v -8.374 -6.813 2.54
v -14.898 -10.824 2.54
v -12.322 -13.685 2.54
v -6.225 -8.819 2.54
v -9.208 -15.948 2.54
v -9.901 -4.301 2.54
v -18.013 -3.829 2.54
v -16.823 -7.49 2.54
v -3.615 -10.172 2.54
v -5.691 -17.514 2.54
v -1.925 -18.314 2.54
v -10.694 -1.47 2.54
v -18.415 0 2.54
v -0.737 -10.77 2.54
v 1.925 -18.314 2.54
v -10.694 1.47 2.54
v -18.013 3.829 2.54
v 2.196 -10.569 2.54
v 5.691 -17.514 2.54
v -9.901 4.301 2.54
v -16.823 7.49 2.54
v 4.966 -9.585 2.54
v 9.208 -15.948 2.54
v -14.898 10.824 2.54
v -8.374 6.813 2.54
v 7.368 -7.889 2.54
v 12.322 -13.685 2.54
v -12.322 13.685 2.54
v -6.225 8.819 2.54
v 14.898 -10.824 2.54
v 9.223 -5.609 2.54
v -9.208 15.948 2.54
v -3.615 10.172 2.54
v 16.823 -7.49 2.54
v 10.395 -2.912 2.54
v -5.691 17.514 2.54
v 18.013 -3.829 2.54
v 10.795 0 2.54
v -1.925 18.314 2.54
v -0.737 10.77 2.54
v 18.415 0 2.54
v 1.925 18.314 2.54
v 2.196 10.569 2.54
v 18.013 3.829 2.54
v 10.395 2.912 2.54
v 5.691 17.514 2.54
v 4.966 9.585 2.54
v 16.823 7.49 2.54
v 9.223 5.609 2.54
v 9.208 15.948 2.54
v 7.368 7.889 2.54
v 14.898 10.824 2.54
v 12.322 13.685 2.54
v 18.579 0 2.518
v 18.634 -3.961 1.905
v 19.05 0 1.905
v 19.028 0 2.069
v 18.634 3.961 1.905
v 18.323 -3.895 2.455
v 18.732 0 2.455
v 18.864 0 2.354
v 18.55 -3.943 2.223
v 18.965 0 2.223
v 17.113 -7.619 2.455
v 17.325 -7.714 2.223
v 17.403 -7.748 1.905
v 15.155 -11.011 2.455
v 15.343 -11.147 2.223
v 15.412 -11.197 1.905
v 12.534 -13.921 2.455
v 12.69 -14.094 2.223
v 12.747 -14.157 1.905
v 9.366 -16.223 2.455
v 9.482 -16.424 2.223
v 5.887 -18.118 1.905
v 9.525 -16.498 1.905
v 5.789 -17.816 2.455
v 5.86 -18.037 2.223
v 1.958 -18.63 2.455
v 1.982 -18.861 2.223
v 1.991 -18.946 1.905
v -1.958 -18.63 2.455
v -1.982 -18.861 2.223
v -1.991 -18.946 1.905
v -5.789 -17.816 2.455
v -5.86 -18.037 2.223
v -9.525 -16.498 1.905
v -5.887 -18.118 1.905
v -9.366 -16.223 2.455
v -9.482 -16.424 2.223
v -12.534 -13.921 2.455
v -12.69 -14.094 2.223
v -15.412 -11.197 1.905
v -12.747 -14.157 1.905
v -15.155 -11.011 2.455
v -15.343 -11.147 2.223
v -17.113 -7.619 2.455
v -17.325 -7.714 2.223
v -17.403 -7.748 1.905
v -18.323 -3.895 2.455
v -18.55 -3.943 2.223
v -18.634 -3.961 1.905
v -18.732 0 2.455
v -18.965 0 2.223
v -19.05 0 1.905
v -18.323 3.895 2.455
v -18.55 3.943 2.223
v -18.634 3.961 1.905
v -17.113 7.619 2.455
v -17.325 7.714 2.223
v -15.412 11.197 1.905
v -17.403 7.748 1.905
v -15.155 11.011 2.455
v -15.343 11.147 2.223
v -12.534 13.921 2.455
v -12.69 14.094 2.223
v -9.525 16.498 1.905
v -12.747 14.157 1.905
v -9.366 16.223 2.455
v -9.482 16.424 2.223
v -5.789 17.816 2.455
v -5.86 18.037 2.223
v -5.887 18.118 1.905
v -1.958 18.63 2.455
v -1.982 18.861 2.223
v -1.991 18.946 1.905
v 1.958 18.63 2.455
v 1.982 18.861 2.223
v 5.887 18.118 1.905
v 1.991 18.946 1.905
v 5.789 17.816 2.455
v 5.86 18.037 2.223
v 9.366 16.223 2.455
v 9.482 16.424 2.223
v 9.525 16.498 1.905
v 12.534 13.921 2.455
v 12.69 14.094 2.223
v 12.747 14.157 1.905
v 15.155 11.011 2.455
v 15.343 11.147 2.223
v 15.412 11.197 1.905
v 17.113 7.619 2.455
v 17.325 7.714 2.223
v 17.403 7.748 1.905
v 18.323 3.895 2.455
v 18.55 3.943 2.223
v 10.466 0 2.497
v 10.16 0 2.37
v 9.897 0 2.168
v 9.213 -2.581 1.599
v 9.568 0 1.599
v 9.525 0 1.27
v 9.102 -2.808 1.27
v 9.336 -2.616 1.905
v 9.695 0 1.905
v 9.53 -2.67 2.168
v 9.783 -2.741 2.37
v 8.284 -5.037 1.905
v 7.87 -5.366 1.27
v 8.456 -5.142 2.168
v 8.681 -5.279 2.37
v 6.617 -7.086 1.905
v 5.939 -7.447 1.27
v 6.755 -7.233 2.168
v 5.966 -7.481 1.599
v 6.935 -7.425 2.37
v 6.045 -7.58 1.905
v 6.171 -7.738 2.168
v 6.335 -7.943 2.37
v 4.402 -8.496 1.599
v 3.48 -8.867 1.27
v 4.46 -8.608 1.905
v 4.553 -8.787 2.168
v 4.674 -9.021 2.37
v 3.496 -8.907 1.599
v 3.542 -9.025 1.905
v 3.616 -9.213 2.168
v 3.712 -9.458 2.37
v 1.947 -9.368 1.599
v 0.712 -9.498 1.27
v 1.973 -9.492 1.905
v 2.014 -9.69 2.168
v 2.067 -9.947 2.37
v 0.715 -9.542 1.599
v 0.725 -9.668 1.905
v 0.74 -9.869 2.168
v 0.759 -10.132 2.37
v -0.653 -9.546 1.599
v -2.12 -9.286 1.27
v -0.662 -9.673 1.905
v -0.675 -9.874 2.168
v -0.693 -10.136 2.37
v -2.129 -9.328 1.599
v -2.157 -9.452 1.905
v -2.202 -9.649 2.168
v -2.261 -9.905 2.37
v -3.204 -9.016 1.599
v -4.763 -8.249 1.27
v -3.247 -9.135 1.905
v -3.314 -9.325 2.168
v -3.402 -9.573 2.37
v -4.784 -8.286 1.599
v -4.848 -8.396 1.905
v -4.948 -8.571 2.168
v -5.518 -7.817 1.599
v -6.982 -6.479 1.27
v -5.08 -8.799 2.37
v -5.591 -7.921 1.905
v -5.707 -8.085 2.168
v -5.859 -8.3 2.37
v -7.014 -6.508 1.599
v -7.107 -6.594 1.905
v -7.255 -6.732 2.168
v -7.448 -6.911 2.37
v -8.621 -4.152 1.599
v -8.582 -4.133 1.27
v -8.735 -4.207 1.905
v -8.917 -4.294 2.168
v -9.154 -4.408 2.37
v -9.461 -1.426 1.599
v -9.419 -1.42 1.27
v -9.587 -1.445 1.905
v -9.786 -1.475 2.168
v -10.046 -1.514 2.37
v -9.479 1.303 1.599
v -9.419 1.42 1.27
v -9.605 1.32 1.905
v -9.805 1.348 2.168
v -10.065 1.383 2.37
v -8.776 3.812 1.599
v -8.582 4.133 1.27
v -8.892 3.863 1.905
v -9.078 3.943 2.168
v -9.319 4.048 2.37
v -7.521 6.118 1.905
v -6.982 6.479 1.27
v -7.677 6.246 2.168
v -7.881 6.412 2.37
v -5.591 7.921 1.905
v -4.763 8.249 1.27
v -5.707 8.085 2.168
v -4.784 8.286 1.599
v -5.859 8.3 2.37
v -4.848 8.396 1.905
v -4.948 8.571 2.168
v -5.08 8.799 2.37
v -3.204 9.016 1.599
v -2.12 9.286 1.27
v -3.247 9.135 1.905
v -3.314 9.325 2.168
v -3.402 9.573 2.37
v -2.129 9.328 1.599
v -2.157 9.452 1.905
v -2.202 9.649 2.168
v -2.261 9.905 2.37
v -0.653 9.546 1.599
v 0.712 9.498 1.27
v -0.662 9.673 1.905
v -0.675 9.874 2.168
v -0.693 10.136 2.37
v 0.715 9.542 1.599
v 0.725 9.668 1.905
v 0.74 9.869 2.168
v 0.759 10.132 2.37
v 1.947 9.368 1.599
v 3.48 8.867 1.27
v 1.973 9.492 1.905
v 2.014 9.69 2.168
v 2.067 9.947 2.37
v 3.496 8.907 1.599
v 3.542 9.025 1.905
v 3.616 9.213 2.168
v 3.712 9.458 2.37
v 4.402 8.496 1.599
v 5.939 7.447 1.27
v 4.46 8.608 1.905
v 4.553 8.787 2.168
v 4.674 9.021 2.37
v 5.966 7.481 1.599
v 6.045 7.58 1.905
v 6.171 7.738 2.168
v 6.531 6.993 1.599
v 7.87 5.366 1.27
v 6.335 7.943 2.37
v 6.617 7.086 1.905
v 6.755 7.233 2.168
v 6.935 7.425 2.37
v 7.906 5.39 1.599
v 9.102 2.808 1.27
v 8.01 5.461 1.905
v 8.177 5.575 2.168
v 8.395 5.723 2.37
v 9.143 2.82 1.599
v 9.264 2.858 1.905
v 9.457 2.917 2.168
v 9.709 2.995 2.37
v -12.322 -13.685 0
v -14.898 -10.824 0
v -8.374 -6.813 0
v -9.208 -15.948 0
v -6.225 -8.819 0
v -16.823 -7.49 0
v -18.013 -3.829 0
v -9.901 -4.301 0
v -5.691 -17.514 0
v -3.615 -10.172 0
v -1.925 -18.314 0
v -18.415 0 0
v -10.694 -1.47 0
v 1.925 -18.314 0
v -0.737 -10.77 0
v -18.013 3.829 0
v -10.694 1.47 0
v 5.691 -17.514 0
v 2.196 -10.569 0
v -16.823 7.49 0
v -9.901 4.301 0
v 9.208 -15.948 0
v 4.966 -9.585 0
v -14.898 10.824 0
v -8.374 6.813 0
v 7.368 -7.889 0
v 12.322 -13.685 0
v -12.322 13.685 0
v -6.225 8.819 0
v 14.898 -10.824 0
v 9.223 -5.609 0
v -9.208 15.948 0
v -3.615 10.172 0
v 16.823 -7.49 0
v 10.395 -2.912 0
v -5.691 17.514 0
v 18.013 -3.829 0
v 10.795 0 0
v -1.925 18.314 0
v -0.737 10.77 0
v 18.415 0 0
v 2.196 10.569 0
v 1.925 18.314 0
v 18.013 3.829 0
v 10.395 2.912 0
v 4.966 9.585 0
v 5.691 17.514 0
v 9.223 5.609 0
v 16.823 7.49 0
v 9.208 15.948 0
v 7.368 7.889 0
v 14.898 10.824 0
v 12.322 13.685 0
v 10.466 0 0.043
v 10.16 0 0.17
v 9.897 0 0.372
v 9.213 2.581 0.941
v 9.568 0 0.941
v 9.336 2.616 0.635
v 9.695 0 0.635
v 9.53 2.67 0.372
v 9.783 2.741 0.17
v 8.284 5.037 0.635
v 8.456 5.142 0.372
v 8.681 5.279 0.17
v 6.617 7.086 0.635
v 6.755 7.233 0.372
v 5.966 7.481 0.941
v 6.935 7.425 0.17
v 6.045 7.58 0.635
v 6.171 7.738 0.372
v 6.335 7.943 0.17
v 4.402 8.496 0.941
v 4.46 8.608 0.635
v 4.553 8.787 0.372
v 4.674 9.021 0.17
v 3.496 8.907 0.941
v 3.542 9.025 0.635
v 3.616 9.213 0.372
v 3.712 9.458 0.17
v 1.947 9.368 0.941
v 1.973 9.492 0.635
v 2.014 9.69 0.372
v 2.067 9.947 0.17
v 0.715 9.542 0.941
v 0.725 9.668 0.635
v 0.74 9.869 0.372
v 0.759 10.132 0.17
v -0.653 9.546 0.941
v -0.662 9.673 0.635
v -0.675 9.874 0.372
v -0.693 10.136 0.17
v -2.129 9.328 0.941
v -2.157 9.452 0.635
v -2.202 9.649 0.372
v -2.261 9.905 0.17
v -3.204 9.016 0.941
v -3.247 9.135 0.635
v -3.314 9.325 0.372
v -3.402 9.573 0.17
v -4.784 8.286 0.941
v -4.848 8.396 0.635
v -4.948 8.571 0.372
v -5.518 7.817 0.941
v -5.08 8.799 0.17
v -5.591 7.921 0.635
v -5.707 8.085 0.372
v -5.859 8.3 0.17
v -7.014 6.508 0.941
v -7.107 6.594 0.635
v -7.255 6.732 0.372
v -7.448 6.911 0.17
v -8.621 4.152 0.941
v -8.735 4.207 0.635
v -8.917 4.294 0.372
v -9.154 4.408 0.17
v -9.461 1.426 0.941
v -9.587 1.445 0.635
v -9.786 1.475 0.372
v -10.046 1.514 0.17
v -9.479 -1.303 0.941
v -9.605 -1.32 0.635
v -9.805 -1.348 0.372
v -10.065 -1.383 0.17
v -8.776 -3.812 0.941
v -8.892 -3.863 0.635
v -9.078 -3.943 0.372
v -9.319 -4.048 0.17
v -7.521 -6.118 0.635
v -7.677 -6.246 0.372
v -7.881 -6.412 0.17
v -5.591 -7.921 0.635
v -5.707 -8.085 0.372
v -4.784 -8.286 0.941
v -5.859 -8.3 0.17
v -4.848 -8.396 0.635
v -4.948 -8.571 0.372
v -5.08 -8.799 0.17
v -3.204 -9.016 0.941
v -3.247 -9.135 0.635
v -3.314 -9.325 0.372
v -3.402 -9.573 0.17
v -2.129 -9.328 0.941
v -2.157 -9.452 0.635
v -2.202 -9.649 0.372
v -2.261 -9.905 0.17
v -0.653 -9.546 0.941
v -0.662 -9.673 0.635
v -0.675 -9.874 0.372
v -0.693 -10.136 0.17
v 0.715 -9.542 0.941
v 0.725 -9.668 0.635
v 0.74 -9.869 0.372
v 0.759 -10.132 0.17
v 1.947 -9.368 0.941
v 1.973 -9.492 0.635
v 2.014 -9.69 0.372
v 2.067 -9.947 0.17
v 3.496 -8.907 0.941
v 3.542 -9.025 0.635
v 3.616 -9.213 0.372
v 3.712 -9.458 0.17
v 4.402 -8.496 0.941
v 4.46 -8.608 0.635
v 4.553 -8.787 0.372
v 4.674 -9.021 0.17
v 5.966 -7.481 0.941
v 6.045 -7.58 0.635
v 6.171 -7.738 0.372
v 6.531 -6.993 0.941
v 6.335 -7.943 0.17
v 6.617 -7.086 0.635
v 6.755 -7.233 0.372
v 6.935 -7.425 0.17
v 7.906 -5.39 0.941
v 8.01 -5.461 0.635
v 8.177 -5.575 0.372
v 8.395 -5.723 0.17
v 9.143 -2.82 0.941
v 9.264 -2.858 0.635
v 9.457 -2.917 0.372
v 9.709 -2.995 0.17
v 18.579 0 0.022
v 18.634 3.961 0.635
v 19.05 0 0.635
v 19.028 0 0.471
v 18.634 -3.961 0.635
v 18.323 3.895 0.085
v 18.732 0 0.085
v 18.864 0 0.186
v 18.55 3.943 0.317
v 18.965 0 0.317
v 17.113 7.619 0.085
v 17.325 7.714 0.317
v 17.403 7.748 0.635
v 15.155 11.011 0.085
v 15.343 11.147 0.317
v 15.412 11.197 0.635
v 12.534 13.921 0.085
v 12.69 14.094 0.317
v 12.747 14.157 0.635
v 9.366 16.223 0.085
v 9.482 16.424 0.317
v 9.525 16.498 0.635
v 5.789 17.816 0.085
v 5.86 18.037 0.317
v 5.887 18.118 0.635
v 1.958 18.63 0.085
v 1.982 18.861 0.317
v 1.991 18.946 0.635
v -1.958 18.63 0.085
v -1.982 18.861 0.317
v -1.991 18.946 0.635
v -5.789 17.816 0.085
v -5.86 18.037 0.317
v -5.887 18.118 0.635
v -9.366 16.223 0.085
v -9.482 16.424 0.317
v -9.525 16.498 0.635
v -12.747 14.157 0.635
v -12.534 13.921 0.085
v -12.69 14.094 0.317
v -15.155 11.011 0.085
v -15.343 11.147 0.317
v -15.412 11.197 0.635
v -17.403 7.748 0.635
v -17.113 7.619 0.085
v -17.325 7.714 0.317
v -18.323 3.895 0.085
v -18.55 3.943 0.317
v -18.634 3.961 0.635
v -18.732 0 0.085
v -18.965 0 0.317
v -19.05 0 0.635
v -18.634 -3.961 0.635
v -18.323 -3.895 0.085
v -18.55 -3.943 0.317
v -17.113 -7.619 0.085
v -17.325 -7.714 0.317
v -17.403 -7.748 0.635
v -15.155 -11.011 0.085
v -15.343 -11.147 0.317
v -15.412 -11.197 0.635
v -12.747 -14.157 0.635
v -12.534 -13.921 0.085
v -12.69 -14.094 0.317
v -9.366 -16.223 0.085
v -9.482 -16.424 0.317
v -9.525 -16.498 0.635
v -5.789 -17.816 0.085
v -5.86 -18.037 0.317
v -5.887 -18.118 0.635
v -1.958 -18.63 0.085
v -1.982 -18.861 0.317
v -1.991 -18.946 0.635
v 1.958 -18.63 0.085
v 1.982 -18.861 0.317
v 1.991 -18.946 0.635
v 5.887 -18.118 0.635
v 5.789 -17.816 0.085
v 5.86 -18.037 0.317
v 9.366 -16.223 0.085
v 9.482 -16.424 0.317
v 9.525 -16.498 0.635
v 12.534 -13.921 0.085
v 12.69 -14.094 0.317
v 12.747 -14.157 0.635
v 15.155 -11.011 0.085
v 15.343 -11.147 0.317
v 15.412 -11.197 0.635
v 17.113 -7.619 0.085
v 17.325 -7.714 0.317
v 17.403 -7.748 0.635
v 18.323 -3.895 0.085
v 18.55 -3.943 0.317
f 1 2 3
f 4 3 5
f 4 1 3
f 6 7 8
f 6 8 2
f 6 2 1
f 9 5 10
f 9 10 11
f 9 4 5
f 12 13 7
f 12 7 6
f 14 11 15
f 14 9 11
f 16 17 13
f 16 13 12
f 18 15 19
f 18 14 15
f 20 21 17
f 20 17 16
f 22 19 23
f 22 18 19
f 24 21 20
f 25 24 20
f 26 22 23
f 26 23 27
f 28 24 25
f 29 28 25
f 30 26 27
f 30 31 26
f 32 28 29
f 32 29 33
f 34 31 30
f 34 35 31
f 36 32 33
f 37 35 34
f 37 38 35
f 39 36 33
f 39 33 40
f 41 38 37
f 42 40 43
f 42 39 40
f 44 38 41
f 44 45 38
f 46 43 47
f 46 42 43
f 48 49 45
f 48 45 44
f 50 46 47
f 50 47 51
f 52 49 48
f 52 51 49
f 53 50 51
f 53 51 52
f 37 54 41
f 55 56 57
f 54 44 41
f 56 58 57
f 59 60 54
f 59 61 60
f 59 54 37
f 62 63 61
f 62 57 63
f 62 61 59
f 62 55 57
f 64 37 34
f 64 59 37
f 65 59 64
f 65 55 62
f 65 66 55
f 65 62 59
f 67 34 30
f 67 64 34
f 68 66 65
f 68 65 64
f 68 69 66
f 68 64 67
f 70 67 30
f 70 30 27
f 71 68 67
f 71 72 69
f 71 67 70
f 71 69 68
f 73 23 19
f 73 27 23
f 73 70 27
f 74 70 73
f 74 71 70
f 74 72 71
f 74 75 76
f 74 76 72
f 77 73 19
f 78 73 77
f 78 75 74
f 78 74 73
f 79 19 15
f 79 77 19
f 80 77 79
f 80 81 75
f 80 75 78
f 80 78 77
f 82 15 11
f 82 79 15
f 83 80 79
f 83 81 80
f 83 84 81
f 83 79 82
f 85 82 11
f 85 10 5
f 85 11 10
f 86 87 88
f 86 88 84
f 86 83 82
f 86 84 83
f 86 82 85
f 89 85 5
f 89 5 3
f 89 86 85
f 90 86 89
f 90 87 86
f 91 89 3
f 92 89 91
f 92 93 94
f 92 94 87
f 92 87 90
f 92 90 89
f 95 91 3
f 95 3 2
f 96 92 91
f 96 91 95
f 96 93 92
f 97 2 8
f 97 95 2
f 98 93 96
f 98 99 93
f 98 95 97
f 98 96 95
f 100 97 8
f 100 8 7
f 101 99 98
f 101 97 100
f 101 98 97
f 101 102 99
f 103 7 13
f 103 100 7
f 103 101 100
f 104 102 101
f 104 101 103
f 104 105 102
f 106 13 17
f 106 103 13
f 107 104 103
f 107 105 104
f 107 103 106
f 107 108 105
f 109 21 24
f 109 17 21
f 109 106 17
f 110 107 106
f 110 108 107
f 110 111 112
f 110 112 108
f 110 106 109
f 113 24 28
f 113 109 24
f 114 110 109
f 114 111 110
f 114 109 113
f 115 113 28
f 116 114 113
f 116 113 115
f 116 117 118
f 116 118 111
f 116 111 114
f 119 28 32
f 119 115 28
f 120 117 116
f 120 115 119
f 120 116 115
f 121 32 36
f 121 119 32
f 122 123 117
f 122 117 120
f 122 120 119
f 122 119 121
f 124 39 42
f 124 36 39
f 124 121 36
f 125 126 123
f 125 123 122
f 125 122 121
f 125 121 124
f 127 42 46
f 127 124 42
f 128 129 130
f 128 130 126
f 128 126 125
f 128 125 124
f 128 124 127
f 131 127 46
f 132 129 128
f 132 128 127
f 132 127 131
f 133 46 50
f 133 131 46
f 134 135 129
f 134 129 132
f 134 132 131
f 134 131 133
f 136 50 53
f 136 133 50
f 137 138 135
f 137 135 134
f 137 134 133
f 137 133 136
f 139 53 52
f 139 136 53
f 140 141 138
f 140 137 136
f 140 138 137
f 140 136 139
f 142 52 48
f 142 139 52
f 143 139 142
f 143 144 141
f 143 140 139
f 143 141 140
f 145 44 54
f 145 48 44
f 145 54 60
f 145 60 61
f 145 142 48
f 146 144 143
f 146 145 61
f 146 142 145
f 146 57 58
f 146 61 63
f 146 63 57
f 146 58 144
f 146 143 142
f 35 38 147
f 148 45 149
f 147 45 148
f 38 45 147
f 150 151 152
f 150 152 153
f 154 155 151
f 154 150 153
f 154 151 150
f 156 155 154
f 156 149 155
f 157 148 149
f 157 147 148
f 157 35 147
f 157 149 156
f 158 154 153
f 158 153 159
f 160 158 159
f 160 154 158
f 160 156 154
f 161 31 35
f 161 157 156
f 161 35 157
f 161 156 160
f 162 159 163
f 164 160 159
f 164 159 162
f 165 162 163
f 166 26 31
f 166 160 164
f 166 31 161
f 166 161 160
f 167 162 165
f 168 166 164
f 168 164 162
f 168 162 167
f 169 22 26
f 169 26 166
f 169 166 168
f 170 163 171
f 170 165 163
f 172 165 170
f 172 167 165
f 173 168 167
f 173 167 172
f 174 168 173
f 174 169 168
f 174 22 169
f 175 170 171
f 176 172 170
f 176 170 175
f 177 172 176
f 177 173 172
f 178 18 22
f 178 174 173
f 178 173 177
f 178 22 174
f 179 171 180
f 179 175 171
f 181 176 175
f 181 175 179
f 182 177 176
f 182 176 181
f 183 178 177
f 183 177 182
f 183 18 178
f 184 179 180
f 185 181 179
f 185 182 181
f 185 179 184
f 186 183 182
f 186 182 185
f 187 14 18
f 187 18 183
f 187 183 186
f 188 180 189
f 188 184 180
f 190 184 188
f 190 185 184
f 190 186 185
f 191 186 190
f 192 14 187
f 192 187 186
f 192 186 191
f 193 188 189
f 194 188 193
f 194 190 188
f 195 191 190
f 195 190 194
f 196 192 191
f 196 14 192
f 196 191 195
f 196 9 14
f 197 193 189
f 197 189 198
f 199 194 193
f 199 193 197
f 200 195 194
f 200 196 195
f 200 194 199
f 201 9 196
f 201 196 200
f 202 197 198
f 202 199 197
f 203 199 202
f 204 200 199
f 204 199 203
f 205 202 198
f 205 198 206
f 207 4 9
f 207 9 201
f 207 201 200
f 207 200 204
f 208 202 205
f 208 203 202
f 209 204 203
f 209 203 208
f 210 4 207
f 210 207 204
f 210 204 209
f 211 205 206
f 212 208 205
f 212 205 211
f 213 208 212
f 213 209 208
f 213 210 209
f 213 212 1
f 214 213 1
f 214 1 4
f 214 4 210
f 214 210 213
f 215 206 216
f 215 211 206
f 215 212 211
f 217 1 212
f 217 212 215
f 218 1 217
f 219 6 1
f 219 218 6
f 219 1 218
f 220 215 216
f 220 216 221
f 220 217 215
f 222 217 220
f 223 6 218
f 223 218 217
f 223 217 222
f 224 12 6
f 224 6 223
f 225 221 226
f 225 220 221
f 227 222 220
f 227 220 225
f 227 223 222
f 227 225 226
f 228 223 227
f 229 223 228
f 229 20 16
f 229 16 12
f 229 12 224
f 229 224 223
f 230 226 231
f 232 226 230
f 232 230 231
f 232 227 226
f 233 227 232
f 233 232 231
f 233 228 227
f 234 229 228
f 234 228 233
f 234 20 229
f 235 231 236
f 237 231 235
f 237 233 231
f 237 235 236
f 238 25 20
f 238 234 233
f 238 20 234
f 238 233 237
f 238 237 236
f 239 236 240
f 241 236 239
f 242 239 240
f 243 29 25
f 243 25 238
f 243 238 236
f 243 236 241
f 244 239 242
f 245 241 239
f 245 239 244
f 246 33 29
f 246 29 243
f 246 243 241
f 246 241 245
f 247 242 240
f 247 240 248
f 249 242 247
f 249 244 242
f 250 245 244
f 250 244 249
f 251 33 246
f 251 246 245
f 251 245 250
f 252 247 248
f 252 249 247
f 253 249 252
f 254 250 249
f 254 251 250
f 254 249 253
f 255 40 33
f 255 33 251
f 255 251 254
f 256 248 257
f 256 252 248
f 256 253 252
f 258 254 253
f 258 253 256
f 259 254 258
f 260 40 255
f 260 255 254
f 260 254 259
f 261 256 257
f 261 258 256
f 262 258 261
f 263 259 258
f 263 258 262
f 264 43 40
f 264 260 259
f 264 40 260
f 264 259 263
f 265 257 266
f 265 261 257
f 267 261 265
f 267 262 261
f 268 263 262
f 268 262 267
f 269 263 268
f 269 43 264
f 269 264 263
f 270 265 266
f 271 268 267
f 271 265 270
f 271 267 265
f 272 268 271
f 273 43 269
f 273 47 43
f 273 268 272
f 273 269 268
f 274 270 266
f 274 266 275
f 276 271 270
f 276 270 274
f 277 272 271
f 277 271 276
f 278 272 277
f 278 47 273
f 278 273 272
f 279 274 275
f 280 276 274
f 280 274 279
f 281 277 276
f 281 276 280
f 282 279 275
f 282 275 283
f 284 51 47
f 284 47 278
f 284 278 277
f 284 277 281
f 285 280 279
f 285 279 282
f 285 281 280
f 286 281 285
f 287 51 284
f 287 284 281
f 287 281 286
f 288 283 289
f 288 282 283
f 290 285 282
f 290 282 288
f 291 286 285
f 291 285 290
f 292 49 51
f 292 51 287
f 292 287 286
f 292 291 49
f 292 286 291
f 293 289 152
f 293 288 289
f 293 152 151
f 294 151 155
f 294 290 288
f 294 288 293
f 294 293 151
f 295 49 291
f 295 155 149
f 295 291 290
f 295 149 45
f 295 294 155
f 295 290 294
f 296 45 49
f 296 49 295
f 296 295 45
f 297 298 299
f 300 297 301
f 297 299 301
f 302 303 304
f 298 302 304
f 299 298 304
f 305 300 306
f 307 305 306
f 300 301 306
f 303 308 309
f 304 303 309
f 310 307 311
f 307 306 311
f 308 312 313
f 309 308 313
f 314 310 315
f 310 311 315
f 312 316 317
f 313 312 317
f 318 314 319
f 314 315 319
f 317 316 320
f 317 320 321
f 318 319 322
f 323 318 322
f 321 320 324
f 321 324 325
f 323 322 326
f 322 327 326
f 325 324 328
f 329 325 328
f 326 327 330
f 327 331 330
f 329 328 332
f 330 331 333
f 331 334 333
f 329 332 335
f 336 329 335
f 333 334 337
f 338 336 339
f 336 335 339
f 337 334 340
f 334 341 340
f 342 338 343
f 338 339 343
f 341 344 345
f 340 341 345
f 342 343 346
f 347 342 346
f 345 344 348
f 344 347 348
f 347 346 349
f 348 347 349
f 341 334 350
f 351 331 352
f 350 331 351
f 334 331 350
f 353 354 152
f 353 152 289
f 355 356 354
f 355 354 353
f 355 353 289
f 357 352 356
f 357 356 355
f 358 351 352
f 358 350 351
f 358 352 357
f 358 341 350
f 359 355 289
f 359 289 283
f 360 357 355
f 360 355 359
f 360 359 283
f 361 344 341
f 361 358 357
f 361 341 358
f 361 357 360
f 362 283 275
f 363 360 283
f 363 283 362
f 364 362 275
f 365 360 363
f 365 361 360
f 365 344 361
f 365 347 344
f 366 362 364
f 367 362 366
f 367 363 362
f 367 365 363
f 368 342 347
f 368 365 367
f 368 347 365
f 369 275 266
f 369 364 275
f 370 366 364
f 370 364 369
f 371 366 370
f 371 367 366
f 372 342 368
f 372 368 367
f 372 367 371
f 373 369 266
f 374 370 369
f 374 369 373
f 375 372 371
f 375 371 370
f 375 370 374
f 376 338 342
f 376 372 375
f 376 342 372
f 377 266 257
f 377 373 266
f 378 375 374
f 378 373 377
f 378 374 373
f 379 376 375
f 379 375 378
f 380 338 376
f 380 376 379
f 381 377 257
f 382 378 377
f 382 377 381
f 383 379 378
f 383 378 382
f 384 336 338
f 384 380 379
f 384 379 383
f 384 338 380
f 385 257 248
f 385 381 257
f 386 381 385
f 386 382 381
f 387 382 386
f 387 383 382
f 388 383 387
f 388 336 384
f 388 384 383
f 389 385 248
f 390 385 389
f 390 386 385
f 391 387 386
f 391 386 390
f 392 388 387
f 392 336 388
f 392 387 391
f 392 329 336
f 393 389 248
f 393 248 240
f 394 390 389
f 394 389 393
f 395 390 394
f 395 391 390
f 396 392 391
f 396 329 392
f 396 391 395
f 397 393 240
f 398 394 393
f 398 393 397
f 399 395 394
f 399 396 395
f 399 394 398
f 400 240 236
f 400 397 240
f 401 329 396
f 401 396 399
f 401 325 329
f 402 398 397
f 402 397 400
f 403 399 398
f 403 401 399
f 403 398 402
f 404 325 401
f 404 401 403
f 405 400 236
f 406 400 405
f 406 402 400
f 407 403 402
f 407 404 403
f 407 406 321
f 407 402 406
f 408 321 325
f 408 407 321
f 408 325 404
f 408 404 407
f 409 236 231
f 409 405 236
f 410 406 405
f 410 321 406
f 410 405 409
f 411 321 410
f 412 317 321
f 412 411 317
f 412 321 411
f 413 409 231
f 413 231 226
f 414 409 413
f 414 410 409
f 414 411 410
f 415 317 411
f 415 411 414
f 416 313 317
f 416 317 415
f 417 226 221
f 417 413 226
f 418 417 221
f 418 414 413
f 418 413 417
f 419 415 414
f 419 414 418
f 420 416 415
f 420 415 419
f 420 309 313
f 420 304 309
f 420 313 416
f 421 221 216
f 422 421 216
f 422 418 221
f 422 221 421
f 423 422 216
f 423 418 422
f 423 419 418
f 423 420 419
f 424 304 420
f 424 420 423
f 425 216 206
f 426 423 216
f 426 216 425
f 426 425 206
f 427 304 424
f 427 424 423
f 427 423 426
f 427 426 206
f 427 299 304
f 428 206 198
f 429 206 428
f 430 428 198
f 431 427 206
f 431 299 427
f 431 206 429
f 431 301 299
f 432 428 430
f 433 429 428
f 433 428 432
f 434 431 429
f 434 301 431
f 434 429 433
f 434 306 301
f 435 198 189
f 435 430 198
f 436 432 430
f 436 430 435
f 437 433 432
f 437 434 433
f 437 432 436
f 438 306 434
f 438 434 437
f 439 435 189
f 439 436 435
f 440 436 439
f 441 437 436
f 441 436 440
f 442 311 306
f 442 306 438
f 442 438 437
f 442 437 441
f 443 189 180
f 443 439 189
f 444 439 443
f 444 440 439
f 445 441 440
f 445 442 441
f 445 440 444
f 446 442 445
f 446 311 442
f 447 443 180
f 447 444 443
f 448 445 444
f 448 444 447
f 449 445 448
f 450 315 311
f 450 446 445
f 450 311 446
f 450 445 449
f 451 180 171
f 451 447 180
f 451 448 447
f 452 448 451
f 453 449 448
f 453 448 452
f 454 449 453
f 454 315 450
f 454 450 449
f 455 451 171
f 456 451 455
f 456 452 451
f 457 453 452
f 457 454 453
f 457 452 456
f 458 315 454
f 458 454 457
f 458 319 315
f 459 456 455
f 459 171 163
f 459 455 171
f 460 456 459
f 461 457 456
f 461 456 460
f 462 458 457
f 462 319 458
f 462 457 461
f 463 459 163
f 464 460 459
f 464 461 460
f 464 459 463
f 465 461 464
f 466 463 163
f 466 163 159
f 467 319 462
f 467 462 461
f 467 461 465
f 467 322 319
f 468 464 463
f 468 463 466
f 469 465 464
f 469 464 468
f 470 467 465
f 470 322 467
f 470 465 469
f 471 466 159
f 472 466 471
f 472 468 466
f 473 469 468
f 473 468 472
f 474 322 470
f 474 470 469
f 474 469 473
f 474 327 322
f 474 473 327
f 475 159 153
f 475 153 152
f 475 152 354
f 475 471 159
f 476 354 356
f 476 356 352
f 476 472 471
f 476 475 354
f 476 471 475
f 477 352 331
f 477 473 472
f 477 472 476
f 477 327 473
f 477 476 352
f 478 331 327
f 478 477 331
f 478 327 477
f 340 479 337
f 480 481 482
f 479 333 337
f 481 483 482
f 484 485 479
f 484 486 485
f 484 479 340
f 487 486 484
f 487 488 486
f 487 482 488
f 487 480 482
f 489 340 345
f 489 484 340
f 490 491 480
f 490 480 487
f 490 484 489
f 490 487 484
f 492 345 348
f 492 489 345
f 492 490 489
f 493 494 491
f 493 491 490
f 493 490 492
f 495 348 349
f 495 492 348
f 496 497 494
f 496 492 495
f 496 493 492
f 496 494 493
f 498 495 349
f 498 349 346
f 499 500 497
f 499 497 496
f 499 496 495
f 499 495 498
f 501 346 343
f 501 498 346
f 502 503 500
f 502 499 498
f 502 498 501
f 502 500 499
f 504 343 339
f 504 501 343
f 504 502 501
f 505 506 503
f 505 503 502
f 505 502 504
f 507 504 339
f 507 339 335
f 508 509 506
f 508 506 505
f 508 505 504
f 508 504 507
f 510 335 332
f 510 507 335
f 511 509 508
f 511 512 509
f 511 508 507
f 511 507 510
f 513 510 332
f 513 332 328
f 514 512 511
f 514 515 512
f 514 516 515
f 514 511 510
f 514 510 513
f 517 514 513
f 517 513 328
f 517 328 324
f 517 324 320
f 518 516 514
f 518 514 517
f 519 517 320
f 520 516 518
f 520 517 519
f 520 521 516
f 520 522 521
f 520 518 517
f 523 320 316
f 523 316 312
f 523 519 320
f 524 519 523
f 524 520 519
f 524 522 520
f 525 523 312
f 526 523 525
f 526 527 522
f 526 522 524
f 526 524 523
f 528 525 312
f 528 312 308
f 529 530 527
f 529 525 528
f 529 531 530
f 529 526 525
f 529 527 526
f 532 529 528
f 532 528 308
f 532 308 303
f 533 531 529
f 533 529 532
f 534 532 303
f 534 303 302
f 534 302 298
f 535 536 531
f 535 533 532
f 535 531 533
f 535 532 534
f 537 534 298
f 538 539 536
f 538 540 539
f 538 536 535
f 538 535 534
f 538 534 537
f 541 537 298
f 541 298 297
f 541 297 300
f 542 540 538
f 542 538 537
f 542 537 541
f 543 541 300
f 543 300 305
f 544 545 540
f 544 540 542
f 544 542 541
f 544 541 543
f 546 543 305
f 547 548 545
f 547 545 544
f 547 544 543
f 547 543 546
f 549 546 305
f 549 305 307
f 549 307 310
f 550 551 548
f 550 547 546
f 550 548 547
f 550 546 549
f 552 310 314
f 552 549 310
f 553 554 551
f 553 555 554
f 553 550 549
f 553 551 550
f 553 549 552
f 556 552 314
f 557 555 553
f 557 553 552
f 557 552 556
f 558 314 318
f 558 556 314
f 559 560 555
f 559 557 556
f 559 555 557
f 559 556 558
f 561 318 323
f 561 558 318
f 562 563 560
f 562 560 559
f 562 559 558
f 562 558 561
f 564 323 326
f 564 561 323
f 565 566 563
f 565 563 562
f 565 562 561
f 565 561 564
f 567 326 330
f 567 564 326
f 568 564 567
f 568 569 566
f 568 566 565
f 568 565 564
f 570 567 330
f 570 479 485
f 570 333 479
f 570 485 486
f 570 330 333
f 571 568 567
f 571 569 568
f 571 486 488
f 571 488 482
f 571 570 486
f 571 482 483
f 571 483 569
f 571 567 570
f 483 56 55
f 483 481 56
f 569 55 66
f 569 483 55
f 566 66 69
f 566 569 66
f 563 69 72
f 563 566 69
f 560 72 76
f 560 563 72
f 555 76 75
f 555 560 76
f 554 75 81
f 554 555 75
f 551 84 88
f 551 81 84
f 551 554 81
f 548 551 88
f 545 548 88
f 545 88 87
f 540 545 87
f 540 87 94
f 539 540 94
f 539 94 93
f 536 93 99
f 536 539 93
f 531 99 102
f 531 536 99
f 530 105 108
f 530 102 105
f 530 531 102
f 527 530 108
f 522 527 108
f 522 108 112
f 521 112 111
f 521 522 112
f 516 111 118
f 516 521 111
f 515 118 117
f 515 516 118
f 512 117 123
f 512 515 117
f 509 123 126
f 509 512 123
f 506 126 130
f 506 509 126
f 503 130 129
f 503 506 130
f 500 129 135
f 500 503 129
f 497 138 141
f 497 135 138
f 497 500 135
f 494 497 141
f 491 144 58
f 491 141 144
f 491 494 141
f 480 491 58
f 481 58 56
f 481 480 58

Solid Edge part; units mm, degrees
sketch "Sketch1" plane through (0, 0, 0) normal (0, 0, 1) x (1, 0, 0)
  circle A0 centre (0, 0) radius 19.05
  circle A1 centre (0, 0) radius 9.525
extrude "Protrusion1" add sketch "Sketch1" along normal blind 2.54
fillet "Round_1" radius 1.27 2 edges at (-9.525, 0, 2.54) (-9.525, 0, 0)
fillet "Round_2" radius 0.635 2 edges at (-19.05, 0, 2.54) (-19.05, 0, 0)
